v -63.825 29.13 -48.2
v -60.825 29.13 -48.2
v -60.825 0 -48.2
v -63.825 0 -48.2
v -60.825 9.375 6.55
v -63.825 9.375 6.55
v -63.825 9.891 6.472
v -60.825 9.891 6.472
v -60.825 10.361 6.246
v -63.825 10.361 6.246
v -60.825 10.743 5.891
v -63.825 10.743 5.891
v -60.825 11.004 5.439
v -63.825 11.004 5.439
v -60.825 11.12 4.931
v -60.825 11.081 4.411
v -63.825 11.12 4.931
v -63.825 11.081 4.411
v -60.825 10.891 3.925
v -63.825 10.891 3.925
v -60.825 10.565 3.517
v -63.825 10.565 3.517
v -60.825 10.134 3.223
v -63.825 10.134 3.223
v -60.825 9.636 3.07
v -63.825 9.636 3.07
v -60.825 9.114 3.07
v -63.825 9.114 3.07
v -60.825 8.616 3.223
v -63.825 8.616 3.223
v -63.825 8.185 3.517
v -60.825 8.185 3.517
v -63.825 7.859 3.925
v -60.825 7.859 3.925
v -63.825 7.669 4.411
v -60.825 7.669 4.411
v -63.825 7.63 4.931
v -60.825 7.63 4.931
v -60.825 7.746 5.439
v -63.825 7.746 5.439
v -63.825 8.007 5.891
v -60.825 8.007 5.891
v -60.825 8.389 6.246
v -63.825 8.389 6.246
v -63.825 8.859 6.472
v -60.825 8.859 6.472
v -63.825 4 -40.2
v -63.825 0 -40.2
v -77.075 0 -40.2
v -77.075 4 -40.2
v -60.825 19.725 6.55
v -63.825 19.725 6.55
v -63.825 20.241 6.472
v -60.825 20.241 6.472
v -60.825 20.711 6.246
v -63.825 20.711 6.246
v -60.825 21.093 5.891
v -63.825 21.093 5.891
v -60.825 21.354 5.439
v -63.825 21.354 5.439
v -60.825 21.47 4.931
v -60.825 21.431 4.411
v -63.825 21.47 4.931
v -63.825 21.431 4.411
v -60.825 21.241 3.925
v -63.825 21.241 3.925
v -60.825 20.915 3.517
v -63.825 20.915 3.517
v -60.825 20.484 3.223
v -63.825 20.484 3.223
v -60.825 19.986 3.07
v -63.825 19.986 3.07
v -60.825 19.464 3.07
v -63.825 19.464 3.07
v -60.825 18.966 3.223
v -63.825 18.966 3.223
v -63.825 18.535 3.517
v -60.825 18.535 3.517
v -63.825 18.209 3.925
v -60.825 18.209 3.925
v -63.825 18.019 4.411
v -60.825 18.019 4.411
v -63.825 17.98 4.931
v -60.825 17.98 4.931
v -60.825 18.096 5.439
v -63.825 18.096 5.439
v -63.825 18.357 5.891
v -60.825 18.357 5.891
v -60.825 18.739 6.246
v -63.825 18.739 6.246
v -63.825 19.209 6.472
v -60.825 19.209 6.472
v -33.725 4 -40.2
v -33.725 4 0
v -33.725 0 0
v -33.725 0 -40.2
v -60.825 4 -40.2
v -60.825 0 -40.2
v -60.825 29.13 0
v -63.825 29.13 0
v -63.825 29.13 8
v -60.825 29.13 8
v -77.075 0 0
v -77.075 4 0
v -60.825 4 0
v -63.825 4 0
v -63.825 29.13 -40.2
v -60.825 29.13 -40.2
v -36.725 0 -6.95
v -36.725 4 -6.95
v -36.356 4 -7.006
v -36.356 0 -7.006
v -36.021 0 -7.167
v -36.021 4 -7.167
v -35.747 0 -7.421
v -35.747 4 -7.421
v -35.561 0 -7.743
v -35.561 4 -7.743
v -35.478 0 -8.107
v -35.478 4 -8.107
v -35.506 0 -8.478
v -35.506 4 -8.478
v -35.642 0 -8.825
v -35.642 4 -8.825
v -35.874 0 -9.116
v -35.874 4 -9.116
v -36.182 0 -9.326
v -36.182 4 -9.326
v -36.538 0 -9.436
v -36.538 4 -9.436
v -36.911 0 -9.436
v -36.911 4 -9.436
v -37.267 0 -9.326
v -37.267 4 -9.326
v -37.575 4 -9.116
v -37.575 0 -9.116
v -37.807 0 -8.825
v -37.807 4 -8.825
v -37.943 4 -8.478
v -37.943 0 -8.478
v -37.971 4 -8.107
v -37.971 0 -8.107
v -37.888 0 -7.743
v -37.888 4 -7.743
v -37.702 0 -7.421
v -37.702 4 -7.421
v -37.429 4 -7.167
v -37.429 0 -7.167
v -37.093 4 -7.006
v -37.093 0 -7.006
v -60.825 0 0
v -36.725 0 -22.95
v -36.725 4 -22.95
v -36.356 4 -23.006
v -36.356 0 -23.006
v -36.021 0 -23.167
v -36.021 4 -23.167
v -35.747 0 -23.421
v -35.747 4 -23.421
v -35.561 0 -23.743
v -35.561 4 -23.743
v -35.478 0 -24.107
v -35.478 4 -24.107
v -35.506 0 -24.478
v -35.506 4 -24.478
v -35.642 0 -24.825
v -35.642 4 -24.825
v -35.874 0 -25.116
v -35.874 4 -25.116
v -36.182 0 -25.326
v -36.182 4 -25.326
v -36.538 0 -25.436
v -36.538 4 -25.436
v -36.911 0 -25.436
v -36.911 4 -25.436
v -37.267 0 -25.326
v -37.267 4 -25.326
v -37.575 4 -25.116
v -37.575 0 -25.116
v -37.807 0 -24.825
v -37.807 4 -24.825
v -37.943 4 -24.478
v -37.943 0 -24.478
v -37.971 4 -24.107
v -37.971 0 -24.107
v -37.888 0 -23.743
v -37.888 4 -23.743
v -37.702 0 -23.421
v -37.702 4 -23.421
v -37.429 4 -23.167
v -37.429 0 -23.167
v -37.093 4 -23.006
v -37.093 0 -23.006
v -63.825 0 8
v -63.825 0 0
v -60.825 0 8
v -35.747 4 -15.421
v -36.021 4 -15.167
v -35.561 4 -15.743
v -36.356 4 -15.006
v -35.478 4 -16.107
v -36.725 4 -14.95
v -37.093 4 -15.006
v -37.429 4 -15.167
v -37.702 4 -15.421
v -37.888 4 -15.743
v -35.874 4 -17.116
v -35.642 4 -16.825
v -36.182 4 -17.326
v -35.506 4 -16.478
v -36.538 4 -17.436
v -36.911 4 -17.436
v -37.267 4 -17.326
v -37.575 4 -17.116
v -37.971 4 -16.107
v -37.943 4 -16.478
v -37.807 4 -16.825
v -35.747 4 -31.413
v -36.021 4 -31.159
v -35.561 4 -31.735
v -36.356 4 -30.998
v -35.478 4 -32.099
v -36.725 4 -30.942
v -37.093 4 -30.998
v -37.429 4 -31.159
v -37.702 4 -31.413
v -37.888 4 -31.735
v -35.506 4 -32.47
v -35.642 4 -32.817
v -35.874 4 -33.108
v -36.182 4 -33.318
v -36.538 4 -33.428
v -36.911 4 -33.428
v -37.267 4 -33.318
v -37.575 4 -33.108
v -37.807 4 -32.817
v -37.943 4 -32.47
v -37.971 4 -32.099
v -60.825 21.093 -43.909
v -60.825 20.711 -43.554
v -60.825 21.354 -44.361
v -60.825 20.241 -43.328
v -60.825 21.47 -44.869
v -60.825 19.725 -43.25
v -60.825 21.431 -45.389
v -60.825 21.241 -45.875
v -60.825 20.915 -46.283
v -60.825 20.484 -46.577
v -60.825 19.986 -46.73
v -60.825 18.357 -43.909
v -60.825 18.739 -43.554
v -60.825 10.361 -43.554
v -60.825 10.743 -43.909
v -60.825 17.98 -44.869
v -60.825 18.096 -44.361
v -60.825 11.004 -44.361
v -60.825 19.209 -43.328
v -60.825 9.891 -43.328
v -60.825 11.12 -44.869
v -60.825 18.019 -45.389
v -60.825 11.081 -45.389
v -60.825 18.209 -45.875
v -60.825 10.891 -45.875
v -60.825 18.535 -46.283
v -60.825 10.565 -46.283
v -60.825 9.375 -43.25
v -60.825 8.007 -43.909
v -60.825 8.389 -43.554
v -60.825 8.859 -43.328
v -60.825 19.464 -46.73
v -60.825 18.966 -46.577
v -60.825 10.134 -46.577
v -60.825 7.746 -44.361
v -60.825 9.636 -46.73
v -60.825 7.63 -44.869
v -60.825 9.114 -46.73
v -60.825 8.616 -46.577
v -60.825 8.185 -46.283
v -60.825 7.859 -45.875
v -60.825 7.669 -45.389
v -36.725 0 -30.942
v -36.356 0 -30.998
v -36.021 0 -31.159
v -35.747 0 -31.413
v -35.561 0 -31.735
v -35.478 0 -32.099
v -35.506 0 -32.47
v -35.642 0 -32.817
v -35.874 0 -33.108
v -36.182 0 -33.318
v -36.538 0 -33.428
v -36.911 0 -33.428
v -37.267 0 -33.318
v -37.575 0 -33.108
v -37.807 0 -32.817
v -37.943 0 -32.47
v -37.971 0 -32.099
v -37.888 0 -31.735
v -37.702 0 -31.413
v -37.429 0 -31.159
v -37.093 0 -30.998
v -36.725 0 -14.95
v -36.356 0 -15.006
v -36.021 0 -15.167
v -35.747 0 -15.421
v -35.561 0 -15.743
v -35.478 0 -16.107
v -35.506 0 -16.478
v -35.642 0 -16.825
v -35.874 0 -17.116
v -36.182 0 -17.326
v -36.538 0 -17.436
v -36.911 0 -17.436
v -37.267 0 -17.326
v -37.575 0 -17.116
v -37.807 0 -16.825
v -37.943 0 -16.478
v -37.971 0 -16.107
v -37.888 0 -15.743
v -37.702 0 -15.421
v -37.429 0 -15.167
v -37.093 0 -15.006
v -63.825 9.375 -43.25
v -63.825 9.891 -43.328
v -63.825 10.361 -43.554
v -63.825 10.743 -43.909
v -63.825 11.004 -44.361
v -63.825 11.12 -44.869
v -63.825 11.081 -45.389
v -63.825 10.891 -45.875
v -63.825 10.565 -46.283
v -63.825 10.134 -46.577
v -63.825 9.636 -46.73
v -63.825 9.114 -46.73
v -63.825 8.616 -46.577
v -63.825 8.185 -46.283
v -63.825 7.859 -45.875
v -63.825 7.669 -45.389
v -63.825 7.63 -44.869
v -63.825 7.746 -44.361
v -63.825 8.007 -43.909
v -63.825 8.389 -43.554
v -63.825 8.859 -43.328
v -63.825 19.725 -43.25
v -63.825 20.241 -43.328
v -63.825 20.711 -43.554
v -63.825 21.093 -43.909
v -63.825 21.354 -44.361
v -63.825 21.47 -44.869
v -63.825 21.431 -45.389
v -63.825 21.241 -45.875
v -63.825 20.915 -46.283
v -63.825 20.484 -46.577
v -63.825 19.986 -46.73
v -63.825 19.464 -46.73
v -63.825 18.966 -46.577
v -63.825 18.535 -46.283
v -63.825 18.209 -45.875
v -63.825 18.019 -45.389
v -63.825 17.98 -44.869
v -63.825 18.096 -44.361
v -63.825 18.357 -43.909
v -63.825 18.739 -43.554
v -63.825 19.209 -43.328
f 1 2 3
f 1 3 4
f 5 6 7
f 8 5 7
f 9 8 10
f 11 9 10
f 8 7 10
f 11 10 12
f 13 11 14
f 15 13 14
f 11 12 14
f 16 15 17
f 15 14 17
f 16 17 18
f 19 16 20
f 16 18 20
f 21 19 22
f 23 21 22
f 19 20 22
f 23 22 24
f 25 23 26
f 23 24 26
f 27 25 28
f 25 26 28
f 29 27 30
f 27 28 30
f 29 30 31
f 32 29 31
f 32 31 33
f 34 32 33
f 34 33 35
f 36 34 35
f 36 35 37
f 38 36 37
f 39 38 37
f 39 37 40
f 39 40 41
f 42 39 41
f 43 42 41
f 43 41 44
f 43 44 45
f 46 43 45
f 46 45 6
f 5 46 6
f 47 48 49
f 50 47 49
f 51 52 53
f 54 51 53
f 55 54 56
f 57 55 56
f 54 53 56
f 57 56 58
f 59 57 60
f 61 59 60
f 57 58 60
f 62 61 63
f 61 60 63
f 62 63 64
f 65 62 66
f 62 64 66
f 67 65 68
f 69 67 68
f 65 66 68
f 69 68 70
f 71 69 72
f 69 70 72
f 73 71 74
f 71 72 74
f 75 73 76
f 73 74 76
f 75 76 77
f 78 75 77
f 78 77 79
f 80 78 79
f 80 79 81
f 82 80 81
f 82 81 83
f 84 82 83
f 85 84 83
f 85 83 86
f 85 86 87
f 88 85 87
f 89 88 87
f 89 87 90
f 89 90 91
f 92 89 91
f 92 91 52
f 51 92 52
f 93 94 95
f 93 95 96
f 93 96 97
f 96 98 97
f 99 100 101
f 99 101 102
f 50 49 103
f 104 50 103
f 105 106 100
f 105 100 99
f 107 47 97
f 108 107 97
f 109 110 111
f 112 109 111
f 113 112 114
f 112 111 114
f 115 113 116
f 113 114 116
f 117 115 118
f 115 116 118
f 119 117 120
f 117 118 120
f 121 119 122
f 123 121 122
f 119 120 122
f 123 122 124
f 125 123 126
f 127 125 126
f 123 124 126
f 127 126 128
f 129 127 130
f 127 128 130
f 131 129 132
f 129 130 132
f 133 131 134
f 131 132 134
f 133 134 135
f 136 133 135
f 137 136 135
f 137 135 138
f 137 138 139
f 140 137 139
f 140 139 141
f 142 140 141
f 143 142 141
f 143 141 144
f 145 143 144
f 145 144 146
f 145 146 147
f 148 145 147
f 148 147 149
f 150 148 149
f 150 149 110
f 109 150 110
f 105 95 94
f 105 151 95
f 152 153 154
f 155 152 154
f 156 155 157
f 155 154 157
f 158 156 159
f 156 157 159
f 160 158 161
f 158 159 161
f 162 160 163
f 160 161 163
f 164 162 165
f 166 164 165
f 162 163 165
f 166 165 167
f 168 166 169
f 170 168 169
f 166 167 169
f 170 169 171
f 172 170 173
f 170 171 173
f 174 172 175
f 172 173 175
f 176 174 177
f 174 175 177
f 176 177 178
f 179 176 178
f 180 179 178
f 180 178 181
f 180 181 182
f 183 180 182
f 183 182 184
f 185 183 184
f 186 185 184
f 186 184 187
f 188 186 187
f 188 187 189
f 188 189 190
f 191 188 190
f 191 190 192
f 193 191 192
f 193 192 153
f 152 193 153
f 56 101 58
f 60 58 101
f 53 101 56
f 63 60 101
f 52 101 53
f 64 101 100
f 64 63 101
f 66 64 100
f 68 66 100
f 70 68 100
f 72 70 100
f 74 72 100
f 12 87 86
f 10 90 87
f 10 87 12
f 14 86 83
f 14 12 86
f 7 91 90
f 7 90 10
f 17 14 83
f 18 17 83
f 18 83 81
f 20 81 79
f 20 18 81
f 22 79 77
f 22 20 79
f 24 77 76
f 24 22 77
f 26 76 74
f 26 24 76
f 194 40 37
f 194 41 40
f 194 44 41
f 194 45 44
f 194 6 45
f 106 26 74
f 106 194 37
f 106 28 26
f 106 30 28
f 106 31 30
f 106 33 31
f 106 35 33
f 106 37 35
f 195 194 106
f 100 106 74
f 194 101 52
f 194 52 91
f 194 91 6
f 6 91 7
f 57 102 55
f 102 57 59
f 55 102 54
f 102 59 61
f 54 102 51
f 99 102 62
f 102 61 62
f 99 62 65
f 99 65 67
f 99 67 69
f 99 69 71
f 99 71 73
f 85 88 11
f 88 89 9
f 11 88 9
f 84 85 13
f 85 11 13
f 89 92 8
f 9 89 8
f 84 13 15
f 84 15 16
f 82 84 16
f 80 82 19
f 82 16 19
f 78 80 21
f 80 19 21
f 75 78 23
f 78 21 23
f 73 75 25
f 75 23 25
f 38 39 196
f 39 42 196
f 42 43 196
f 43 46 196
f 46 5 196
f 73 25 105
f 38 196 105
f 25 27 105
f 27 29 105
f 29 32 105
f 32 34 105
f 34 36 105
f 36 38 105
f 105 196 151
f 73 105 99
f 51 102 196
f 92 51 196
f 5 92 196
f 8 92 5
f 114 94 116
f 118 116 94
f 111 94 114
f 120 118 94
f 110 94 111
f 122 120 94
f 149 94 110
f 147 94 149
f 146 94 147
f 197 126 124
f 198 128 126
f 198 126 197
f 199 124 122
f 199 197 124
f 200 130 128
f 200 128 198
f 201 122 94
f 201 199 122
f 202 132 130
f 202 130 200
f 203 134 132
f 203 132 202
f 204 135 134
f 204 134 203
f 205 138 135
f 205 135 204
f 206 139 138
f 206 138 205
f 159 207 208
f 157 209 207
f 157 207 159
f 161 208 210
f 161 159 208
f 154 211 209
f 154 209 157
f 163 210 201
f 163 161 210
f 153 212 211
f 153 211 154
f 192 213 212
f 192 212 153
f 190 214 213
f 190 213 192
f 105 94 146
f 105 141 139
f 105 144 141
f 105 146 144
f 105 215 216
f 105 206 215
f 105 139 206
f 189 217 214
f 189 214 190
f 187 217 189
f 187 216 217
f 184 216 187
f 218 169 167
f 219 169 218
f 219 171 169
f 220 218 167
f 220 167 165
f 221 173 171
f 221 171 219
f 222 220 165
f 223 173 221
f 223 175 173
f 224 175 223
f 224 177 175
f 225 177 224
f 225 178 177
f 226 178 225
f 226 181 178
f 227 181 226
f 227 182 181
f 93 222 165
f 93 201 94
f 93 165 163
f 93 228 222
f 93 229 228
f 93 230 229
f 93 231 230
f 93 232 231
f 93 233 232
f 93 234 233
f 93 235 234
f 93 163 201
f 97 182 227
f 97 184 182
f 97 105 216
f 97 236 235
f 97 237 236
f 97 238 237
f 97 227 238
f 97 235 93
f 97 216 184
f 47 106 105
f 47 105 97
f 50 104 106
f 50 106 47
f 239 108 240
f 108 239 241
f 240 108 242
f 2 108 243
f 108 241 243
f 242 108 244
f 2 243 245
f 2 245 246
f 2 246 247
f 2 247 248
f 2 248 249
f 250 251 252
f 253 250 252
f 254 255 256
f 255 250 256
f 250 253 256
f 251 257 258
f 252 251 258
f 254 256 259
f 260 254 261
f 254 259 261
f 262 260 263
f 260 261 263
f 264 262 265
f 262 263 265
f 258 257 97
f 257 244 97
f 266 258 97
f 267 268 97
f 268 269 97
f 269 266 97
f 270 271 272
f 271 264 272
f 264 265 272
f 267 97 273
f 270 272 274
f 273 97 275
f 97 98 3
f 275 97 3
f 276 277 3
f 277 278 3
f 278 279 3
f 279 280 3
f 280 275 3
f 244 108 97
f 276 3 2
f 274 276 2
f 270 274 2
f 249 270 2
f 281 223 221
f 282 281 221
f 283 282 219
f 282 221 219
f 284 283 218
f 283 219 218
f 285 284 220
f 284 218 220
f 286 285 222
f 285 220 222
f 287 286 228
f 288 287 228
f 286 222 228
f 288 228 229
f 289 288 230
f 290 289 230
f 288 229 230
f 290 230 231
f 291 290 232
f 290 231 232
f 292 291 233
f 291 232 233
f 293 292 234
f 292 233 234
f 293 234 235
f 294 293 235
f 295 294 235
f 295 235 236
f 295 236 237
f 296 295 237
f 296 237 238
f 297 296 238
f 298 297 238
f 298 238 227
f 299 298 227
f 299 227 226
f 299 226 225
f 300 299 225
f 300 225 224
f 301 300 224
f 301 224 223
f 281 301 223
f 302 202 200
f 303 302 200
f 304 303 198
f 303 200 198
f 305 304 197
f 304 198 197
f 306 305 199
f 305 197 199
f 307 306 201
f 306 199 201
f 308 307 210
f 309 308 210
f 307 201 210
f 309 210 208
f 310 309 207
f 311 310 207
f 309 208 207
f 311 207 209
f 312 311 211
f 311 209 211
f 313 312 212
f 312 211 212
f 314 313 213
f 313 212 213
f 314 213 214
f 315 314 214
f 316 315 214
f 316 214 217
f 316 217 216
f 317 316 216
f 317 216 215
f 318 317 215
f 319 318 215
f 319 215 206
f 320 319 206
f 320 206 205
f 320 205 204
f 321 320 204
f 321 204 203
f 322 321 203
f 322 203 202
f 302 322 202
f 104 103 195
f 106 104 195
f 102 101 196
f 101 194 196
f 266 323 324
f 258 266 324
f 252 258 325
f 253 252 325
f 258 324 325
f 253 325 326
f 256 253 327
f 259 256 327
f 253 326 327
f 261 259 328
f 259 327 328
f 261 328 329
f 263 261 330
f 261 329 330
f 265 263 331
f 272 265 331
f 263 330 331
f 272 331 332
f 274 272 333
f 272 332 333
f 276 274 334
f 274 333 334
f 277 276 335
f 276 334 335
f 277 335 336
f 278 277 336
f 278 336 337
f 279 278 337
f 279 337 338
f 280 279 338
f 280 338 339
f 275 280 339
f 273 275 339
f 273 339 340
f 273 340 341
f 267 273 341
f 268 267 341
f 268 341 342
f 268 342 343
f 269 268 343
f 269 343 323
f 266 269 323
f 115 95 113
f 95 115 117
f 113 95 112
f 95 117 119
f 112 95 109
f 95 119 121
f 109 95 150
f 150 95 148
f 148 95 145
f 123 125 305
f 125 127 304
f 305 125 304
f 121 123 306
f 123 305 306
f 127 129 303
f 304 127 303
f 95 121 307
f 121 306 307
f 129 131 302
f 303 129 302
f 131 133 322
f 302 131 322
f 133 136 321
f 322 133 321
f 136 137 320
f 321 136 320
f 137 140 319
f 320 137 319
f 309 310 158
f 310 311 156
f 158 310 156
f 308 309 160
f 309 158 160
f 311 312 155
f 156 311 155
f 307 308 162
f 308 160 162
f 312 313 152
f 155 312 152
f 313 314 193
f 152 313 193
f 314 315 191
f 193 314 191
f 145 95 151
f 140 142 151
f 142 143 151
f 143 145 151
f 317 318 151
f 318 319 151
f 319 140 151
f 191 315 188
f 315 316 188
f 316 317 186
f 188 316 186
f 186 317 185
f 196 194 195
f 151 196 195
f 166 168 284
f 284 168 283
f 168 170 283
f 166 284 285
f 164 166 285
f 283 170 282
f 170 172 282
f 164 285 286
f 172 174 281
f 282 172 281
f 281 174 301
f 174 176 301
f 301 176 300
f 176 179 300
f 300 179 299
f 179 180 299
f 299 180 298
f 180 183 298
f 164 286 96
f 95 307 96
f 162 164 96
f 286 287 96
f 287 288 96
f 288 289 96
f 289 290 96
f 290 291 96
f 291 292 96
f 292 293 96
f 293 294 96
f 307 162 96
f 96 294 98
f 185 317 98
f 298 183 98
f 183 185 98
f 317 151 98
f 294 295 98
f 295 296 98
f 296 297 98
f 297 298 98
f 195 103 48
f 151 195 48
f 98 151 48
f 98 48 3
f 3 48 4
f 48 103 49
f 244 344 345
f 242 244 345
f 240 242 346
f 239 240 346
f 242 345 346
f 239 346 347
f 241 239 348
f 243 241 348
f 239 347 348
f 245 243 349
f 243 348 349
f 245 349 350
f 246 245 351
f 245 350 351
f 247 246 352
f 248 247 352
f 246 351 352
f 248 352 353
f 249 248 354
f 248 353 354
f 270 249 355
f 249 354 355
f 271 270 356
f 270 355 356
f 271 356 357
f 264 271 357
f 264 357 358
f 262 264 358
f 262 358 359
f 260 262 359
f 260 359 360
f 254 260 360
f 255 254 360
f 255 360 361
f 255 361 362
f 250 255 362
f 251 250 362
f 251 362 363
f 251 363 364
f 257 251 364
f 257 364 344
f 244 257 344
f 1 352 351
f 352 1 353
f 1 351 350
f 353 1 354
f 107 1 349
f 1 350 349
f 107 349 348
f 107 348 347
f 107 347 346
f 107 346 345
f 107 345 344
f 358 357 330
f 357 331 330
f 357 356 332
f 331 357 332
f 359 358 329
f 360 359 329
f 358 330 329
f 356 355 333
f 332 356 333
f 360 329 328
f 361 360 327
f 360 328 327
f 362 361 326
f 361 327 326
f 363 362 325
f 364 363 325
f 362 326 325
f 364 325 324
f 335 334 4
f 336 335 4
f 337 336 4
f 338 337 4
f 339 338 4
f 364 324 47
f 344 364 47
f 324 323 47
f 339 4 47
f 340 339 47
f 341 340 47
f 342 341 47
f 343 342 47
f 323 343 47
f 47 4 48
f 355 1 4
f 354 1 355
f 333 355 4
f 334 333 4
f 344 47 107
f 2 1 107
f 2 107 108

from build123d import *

# Parameters (mm, degrees)
BOSS_EXTRUDE2_DEPTH = 4
SKETCH24_W          = 3
SKETCH24_H          = 8
BOSS_EXTRUDE3_DEPTH = 25.13
SKETCH25_R          = 1.75
SKETCH25_R_2        = 1.750000009
CUT_EXTRUDE1_DEPTH  = 4
SKETCH26_W          = 40.2
SKETCH26_H          = 4
BOSS_EXTRUDE4_DEPTH = 0.65
SKETCH27_R          = 1.25
CUT_EXTRUDE2_DEPTH  = 5


with BuildPart() as part:
    # Sketch23 → Boss-Extrude2 (new body)
    with BuildSketch(Plane(origin=(0, 0, 0), x_dir=(1, 0, 0), z_dir=(0, 1, 0))):
        Polygon((-77.074690926, 0), (-63.824690926, 0), (-63.824690926, -8), (-60.824690926, -8), (-60.824690926, 0), (-34.374690926, 0), (-34.374690926, 40.2), (-60.824690926, 40.2), (-60.824690926, 48.2), (-63.824690926, 48.2), (-63.824690926, 40.2), (-77.074690926, 40.2), align=None)
    extrude(amount=BOSS_EXTRUDE2_DEPTH)

    # Sketch24 → Boss-Extrude3 (add)
    with BuildSketch(Plane(origin=(0, 4, 0), x_dir=(1, 0, 0), z_dir=(0, 1, 0))):
        with Locations((-62.324690926, -4)):
            Rectangle(SKETCH24_W, SKETCH24_H)
        with Locations((-62.324690926, 44.2)):
            Rectangle(SKETCH24_W, SKETCH24_H)
    extrude(amount=BOSS_EXTRUDE3_DEPTH)

    # Sketch25 → Cut-Extrude1 (cut)
    with BuildSketch(Plane.ZY.offset(63.824690926)):
        with Locations((4.799999987, 9.375)):
            Circle(SKETCH25_R)
        with Locations((-45, 9.375)):
            Circle(SKETCH25_R)
        with Locations((-45, 19.725)):
            Circle(SKETCH25_R)
        with Locations((4.799999987, 19.725)):
            Circle(SKETCH25_R_2)
    extrude(amount=-CUT_EXTRUDE1_DEPTH, mode=Mode.SUBTRACT)

    # Sketch26 → Boss-Extrude4 (add)
    with BuildSketch(Plane(origin=(-34.374690926, 0, 0), x_dir=(0, 0, -1), z_dir=(1, 0, 0))):
        with Locations((20.1, 2)):
            Rectangle(SKETCH26_W, SKETCH26_H)
    extrude(amount=BOSS_EXTRUDE4_DEPTH)

    # Sketch27 → Cut-Extrude2 (cut)
    with BuildSketch(Plane(origin=(0, 4, 0), x_dir=(1, 0, 0), z_dir=(0, 1, 0))):
        with Locations(Location((-36.724690926, 32.192020694, 0), (0, 0, 270))):
            Circle(SKETCH27_R)
        with Locations(Location((-36.724690926, 24.2, 0), (0, 0, 270))):
            Circle(SKETCH27_R)
        with Locations(Location((-36.724690926, 16.2, 0), (0, 0, 270))):
            Circle(SKETCH27_R)
        with Locations(Location((-36.724690926, 8.2, 0), (0, 0, 270))):
            Circle(SKETCH27_R)
    extrude(amount=-CUT_EXTRUDE2_DEPTH, mode=Mode.SUBTRACT)


solid = part.part
